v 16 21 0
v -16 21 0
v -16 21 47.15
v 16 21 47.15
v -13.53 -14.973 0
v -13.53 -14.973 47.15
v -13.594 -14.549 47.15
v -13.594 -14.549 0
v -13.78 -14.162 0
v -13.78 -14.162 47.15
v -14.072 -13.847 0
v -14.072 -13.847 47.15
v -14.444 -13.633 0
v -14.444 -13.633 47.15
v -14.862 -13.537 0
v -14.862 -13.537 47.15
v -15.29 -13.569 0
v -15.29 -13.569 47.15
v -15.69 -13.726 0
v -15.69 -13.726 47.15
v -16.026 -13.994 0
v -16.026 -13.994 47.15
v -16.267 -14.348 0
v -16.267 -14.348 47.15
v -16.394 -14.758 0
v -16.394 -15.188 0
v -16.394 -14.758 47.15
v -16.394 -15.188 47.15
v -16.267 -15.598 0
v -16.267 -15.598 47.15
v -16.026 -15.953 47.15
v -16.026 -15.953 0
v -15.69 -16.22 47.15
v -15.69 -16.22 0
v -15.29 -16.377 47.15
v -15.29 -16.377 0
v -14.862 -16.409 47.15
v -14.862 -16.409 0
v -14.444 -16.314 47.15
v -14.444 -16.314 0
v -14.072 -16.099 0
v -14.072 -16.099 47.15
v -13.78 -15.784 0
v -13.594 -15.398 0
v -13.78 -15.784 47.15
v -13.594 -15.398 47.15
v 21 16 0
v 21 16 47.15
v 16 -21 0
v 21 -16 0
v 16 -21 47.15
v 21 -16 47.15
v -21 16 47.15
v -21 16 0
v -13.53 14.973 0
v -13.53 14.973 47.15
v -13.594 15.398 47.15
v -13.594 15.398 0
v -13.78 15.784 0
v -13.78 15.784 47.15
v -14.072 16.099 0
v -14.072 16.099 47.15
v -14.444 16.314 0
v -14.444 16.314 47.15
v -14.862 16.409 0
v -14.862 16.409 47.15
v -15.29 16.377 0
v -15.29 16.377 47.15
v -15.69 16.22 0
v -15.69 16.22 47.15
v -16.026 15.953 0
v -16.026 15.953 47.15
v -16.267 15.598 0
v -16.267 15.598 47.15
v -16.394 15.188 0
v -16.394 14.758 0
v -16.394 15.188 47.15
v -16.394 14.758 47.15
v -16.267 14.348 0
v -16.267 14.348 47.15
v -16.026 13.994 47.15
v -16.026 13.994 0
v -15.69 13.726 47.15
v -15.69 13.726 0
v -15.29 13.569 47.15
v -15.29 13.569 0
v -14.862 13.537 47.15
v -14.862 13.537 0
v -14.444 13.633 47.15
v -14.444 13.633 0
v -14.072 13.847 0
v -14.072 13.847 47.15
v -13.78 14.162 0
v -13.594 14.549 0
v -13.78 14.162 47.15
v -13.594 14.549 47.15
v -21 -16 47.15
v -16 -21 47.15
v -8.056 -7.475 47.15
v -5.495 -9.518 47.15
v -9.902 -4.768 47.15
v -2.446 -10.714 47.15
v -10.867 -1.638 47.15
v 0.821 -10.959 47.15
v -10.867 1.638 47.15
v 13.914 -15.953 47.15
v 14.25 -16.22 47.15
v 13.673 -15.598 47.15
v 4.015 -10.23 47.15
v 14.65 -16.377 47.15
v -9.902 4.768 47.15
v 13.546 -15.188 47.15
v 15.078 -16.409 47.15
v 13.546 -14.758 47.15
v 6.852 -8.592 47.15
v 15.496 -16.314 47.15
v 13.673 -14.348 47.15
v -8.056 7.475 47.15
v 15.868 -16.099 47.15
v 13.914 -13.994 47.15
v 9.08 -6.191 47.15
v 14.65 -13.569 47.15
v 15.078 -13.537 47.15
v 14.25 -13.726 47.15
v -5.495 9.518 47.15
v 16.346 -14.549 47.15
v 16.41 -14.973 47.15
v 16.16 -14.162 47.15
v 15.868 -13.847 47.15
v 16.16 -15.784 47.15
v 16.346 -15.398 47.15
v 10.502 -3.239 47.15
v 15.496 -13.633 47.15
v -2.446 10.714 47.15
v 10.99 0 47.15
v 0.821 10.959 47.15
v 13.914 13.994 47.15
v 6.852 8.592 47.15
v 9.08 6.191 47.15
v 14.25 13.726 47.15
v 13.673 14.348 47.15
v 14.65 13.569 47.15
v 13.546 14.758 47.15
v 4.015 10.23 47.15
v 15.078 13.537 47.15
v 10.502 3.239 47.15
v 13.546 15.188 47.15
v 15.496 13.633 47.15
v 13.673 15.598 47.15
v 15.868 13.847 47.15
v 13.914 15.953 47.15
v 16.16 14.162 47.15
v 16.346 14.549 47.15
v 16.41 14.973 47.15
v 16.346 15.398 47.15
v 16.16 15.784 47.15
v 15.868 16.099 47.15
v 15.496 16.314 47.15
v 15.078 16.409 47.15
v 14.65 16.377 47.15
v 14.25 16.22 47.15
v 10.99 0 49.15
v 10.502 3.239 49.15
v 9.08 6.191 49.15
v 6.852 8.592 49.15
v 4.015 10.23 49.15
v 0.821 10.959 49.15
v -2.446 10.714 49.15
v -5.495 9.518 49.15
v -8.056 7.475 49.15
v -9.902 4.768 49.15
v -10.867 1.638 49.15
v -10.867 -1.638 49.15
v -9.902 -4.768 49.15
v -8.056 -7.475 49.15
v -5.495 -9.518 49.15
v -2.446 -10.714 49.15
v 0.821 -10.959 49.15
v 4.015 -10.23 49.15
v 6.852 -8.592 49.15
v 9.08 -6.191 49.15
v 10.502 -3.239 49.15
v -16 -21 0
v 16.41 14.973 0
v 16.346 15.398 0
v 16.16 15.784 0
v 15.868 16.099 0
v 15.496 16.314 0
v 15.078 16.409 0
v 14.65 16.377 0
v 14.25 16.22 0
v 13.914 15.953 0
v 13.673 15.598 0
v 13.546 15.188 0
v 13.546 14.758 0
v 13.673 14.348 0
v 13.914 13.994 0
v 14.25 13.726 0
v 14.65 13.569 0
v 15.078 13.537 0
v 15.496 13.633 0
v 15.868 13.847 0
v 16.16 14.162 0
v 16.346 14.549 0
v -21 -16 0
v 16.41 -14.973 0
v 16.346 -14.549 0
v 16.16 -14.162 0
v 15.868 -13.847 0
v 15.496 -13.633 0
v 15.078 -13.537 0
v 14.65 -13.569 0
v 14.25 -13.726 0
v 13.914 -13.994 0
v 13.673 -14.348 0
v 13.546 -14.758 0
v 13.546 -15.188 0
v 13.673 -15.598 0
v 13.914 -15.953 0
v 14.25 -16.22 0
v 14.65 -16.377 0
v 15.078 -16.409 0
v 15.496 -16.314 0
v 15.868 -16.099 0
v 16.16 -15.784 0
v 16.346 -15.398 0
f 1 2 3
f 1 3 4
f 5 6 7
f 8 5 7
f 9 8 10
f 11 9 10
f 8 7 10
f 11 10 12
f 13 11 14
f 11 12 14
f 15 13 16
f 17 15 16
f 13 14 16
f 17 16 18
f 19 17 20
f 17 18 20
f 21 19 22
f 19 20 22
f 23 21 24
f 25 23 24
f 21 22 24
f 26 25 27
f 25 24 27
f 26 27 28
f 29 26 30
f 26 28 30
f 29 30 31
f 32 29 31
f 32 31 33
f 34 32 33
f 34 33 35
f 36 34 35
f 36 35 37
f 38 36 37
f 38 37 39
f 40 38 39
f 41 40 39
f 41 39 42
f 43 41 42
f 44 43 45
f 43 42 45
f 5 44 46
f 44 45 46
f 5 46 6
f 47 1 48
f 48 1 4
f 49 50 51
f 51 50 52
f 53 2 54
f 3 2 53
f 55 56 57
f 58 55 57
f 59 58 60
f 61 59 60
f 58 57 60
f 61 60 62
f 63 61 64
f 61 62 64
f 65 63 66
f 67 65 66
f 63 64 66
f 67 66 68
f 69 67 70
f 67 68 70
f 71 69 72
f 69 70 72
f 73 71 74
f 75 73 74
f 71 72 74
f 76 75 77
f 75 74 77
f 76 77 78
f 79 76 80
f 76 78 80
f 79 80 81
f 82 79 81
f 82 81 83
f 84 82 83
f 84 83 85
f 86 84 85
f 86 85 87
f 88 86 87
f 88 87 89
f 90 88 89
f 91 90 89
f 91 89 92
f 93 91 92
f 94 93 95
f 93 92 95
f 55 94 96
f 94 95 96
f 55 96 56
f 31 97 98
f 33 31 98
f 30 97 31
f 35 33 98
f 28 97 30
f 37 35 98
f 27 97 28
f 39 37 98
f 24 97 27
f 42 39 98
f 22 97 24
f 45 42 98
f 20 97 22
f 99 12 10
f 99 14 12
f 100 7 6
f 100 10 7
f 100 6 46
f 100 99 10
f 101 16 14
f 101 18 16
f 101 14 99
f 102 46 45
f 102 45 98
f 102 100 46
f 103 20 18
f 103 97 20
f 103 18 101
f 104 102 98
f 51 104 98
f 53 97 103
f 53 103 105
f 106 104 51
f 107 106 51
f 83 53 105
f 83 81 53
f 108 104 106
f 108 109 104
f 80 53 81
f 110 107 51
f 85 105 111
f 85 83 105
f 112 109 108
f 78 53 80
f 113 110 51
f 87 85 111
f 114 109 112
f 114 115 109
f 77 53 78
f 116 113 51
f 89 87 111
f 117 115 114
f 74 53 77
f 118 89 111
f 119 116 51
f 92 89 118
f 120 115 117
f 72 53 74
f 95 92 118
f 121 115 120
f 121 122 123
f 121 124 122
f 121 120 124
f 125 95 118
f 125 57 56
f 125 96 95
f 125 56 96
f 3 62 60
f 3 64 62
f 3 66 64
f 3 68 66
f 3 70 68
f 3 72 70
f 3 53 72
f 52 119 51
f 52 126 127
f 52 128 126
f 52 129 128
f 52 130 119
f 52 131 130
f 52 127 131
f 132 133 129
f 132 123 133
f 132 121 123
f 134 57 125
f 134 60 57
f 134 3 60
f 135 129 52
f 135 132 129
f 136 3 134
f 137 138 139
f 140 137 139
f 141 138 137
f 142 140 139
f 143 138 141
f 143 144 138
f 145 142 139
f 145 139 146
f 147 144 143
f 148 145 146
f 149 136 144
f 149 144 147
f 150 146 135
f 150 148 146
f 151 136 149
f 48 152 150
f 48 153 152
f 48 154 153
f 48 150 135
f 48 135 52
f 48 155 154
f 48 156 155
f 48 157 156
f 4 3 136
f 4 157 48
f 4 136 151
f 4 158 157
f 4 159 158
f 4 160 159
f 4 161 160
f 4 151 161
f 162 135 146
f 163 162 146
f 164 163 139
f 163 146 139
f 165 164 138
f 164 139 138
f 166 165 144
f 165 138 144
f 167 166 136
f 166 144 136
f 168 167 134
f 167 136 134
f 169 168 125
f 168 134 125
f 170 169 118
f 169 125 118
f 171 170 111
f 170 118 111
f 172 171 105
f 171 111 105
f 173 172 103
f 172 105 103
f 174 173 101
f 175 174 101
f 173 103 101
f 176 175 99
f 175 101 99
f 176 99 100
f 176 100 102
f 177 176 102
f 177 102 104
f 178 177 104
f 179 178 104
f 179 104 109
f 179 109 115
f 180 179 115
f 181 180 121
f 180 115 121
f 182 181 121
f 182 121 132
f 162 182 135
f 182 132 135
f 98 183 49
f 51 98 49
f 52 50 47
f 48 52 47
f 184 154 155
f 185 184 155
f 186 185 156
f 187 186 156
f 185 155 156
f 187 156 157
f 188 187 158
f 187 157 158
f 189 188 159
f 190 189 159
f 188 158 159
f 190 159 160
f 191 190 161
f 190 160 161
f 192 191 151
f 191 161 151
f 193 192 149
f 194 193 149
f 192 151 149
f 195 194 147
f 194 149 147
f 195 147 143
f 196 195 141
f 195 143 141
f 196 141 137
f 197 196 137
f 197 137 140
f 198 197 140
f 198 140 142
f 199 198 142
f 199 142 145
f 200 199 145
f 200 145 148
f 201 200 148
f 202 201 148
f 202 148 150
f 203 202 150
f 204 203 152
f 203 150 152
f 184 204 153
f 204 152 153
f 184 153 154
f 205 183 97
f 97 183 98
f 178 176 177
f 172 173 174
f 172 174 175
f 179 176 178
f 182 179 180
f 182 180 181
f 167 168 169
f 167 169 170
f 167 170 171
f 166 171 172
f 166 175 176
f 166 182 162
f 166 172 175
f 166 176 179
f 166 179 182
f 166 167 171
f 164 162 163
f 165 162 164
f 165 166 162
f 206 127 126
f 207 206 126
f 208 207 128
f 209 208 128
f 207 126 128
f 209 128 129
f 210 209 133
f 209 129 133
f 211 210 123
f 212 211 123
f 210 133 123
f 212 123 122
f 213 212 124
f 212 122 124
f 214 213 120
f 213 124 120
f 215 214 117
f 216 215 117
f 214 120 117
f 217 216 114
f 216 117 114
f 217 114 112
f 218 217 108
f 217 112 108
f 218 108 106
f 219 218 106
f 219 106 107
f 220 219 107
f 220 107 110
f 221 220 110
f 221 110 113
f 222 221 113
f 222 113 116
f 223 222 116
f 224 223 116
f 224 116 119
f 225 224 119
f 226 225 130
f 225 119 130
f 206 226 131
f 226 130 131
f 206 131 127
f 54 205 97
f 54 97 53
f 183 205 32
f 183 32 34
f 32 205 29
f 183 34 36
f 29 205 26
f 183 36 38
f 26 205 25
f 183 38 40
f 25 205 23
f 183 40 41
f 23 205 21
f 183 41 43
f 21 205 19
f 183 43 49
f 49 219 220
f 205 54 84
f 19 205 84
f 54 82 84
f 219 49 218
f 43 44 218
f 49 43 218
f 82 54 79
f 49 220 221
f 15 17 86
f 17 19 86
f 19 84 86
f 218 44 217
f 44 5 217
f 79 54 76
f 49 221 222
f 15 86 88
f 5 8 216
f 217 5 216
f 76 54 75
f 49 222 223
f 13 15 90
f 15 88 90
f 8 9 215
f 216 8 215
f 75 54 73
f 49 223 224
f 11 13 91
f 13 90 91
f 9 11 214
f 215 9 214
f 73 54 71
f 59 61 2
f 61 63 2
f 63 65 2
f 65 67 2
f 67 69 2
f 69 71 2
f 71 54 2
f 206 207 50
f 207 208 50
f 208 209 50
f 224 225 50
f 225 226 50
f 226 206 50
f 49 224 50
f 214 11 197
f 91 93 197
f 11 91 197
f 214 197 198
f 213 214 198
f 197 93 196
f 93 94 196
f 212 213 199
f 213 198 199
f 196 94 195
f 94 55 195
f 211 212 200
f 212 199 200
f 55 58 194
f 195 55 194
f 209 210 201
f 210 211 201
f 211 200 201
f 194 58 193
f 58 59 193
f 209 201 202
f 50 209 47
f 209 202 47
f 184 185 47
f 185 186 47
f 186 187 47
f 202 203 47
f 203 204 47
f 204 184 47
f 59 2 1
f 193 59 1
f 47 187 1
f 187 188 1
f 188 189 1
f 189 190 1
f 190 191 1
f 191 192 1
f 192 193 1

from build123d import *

# Parameters (mm, degrees)
F0_W     = 42
F0_H     = 42
F1_DEPTH = 47.15
F2_SIZE  = 5
F3_R     = 1.44
F4_DEPTH = 47.15
F5_R     = 10.99
F6_DEPTH = 2


with BuildPart() as f1:
    # F0 (on Top) → F1 (new body)
    with BuildSketch(Plane.XY):
        Rectangle(F0_W, F0_H)
    extrude(amount=F1_DEPTH)

    # F2
    f2_edges = [f1.edges().sort_by_distance(p)[0] for p in [
        (-21, 21, 23.575),
        (-21, -21, 23.575),
        (21, -21, 23.575),
        (21, 21, 23.575),
    ]]
    chamfer(f2_edges, length=F2_SIZE)

    # F3 (on face) → F4 (cut, through all)
    with BuildSketch(Plane.XY.offset(47.15)):
        with Locations((14.97, 14.973074)):
            Circle(F3_R)
        with Locations((14.97, -14.973074)):
            Circle(F3_R)
        with Locations((-14.97, -14.973074)):
            Circle(F3_R)
        with Locations((-14.97, 14.973074)):
            Circle(F3_R)
    extrude(amount=-F4_DEPTH, mode=Mode.SUBTRACT)

    # F5 (on face) → F6 (join)
    with BuildSketch(Plane.XY.offset(47.15)):
        Circle(F5_R)
    extrude(amount=F6_DEPTH)


solid = f1.part
